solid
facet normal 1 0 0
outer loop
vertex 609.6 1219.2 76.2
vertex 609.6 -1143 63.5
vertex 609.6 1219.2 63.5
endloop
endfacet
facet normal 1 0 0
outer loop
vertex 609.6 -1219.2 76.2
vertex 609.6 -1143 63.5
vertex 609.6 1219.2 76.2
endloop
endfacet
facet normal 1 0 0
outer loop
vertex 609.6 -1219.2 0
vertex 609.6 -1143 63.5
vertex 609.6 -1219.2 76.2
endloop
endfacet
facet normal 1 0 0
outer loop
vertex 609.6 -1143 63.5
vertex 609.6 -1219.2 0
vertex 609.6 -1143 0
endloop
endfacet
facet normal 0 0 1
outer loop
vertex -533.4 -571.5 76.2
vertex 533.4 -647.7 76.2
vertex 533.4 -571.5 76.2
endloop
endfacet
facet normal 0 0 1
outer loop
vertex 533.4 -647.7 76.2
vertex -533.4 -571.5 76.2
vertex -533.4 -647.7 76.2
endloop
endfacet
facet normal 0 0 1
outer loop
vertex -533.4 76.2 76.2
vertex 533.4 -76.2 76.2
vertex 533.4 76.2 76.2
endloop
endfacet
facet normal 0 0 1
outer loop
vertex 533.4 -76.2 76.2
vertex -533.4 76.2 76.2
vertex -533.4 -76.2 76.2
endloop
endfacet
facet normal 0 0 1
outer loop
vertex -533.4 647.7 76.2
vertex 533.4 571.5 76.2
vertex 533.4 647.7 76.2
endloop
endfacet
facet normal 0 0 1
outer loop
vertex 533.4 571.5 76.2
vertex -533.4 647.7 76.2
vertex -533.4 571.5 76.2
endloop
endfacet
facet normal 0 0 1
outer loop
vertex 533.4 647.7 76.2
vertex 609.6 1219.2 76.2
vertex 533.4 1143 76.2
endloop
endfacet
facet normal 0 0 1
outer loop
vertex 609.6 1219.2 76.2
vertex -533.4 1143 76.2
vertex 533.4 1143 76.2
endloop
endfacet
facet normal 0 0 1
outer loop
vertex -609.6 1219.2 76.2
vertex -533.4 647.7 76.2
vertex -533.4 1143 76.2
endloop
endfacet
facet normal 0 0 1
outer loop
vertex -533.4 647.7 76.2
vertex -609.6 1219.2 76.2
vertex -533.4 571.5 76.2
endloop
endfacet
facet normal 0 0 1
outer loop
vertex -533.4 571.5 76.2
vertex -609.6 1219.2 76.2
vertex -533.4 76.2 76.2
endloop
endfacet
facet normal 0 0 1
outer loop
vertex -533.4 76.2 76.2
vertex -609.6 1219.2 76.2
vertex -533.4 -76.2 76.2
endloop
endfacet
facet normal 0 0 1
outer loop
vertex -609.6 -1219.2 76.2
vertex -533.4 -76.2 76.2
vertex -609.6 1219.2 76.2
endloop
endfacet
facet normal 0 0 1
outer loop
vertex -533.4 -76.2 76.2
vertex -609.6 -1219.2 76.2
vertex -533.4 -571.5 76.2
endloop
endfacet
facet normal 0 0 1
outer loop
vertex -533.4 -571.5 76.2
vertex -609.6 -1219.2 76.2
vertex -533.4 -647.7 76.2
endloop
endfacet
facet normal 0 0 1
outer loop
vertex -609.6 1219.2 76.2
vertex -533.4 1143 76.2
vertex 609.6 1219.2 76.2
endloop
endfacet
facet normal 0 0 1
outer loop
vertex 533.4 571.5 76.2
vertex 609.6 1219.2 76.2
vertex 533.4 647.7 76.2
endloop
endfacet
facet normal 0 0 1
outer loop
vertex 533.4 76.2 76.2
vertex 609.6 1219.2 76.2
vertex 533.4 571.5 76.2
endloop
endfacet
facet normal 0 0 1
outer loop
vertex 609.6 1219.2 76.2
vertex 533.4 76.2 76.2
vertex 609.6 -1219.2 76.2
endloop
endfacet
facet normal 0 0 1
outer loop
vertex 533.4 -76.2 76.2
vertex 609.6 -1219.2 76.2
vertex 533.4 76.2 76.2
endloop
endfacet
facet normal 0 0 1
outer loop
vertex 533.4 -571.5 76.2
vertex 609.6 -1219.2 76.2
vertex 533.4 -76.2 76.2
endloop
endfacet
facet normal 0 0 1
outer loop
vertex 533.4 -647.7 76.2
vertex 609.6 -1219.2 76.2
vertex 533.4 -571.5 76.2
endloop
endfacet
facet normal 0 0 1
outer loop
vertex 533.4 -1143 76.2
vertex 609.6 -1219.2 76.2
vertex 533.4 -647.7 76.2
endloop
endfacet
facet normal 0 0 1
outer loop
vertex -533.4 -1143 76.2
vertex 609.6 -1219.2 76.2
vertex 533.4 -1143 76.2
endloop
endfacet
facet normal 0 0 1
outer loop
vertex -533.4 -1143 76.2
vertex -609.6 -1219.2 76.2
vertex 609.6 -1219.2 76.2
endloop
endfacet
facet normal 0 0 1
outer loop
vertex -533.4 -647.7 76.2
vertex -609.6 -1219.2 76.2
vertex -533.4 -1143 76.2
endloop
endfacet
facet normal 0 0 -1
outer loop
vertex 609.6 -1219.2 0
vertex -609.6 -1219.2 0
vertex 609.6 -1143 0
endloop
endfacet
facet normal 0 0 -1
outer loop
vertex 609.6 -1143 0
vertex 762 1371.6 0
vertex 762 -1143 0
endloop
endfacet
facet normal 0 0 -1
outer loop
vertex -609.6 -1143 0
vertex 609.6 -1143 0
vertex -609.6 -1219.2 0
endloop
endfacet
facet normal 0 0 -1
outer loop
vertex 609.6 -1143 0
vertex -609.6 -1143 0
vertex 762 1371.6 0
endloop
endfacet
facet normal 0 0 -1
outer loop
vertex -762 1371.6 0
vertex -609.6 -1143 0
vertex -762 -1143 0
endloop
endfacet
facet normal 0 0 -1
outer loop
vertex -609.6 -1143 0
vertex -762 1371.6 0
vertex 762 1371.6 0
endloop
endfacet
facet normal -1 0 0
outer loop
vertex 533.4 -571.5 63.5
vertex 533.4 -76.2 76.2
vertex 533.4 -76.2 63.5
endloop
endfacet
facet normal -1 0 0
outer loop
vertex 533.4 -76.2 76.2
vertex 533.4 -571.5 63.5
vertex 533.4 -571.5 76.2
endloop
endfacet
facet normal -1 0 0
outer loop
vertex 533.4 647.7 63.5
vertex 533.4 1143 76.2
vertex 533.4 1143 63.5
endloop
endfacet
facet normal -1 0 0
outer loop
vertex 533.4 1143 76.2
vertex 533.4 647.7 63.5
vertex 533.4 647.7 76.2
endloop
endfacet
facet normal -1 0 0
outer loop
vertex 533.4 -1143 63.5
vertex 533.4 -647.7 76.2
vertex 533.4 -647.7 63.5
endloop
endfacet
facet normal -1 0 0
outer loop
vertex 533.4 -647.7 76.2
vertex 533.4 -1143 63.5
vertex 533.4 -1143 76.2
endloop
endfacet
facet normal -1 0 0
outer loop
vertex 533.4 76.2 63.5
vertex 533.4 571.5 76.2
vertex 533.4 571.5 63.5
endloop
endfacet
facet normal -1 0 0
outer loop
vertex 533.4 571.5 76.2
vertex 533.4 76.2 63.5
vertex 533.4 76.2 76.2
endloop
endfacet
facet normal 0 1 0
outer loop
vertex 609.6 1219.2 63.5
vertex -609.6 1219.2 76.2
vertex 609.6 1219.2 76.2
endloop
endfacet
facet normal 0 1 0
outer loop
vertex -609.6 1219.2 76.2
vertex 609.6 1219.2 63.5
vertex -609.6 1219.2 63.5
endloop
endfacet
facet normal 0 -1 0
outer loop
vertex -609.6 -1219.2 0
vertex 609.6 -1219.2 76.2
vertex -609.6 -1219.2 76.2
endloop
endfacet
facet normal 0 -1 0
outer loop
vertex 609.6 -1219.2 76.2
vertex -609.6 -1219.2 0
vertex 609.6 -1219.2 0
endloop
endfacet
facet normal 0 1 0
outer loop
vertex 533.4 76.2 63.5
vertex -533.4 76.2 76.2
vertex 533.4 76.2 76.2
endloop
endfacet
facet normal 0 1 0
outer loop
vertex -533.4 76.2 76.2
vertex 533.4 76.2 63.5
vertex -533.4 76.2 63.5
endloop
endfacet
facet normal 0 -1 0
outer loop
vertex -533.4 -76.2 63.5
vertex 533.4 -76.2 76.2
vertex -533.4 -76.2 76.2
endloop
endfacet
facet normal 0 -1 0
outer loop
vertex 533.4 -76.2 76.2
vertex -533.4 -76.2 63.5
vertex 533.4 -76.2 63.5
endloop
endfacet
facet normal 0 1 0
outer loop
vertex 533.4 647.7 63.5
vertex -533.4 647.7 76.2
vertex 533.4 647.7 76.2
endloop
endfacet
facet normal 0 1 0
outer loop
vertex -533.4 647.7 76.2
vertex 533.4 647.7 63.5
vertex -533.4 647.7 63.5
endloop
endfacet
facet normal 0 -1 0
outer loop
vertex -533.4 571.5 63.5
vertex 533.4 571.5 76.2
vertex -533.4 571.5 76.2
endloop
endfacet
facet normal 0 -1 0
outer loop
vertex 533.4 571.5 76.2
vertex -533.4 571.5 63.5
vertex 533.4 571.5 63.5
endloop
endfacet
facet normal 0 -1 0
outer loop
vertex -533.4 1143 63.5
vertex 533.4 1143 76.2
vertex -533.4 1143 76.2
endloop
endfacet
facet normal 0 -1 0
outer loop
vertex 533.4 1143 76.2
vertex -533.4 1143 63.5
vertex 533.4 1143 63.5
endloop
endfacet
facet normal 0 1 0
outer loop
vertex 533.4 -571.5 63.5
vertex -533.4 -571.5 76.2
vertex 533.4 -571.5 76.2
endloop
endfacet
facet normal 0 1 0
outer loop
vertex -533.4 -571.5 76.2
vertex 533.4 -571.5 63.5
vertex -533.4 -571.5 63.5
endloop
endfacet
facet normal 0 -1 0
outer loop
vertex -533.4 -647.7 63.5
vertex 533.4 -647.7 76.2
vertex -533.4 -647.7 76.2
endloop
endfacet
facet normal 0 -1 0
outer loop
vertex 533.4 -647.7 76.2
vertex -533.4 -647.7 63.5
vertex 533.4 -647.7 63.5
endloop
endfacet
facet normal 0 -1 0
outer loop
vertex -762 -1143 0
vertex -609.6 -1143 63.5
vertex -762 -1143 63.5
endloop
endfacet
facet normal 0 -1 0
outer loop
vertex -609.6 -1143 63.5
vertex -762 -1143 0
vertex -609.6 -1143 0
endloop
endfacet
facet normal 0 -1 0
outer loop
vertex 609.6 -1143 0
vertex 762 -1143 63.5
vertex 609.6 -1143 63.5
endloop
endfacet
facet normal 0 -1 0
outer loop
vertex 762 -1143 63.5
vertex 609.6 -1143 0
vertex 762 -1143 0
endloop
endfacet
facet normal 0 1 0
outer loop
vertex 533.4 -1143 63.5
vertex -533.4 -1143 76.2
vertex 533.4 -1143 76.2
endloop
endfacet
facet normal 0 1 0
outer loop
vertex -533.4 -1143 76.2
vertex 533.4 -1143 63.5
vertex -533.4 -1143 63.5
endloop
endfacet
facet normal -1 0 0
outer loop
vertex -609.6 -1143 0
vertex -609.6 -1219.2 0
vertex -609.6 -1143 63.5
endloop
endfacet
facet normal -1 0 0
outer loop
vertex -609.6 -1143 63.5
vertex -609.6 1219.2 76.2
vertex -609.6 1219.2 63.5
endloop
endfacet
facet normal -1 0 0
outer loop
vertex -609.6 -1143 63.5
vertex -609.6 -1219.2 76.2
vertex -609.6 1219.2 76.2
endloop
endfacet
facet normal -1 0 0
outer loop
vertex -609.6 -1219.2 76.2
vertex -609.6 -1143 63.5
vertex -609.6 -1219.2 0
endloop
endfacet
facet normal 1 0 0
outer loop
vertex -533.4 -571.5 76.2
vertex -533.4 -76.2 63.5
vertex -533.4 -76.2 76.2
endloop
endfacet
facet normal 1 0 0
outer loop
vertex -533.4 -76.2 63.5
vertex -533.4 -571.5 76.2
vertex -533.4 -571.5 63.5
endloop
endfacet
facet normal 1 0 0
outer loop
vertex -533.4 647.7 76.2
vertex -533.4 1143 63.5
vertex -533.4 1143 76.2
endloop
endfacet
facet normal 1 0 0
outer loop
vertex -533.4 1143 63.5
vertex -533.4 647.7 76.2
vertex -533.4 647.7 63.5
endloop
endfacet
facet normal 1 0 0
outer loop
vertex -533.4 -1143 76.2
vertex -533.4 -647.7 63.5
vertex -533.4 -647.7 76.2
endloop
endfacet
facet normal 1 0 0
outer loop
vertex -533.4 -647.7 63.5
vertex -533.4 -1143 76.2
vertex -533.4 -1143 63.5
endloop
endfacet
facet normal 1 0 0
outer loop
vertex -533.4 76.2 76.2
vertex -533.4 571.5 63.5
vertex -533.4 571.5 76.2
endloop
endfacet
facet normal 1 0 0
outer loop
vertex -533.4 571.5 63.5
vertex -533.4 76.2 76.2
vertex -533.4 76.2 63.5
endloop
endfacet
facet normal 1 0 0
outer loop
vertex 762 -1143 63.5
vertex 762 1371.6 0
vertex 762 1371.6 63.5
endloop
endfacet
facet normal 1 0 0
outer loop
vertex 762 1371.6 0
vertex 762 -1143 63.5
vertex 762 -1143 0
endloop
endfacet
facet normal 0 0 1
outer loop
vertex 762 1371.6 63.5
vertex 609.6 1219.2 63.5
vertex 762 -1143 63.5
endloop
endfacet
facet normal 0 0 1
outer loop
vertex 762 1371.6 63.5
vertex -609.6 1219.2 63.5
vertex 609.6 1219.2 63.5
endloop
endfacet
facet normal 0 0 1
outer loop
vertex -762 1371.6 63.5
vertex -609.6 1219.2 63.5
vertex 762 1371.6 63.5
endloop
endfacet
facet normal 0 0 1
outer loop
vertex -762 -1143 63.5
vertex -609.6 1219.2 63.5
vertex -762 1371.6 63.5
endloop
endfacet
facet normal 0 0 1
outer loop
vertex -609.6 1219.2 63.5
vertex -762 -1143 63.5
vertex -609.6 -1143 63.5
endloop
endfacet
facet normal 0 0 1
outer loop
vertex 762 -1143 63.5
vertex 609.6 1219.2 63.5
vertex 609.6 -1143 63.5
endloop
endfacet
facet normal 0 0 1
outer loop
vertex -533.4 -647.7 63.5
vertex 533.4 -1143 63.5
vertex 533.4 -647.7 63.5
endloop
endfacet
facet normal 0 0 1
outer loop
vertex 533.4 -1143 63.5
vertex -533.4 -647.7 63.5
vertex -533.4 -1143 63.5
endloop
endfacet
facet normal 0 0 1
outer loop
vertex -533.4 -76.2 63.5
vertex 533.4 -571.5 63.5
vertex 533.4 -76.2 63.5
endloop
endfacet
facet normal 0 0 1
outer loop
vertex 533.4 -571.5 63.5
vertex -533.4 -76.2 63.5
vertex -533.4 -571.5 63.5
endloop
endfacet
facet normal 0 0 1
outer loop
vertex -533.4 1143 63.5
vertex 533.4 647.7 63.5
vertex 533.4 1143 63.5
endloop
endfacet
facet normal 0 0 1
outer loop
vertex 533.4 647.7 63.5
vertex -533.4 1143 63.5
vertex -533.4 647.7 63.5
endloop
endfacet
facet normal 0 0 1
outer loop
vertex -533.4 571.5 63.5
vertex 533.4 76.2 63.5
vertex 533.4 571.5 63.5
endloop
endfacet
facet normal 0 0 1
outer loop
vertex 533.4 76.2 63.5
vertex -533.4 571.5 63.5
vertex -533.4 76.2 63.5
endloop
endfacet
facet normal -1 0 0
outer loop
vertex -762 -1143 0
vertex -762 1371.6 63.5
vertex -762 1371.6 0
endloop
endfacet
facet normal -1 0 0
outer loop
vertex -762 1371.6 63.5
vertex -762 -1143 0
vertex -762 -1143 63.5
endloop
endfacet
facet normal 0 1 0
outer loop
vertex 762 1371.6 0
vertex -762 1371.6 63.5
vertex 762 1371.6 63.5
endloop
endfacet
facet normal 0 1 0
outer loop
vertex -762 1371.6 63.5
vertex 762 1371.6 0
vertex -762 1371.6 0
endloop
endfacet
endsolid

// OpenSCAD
// file: ../components/wheel.scad
use <../lib/convert.scad>
use <../lib/colors.scad>

module wheel() {
  color_black()
  difference() {
      cylinder(h = inches(10), d = inches(31), center = true);
      cylinder(h = inches(13), d = inches(15), center = true);
  }
  color_steel()
    cylinder(h = inches(8), d = inches(15), center = true);
}

wheel();
// file: ../lib/colors.scad
module color_wood() {
  color("#F8D89D")
    children();
}

module color_hdpe() {
  color("#ccd")
    children();
}

module color_steel() {
  color("#888")
    children();
}

module color_white() {
  color("#fafafa")
    children();
}

module color_black() {
  color("#333")
    children();
}

module color_outside() {
  color("#90b0c4")
    children();
}
// file: ../components/trailer_side.scad
use <../lib/convert.scad>

side_thickness = inches(1.25);
bottom_offset = inches(16.71);
front_offset = inches(-51.85);

module trailer_side() {
  translate([front_offset, 0, bottom_offset])
  rotate([90, 0, 0])
    linear_extrude(height = side_thickness)
      import("../../drawings/sidewall.dxf");
}

trailer_side();
// file: ../components/trailer_floor.scad
use <../lib/convert.scad>

floor_thickness = inches(2.5);
floor_width = feet(5);
floor_length = feet(8) + inches(3);

module trailer_floor() {
  translate([0, 0, floor_thickness / 2])
    color("#f2ba52")
      cube([floor_width, floor_length, floor_thickness], center = true);
}

trailer_floor();
// file: ../components/trailer_frame.scad
use <../lib/convert.scad>
use <../lib/colors.scad>
use <../components/wheel.scad>

frame_width = feet(4);
frame_length = feet(8);
frame_thickness = inches(3);

module trailer_axel() {
  color_black()
  translate([0, inches(15), inches(-10)])
  rotate([0, 90, 0])
    cylinder(h = frame_width + inches(5), d = inches(3), center  = true);
}

module driver_wheel() {
  translate([feet(2.5), inches(15), inches(-10)])
  rotate([0, 90, 0])
    wheel();
}

module passenger_wheel() {
  mirror([1, 0, 0])
    driver_wheel();
}

module trailer_tongue() {
  union() {
    translate([inches(-1.5), 0, 0])
    rotate([0, 0, -60])
      cube([frame_width, frame_thickness, frame_thickness]);

    mirror([1, 0, 0])
    translate([inches(-1.5), 0, 0])
    rotate([0, 0, -60])
      cube([frame_width, frame_thickness, frame_thickness]);
  }
}

module trailer_frame_half() {
  union() {
    translate([(frame_width / 2) - frame_thickness, -frame_length / 2, 0])
      cube([frame_thickness, frame_length, frame_thickness]);

    translate([0, 0, 0])
      cube([frame_width / 2, frame_thickness, frame_thickness]);

    translate([0, -frame_thickness, 0])
      cube([frame_width / 2, frame_thickness, frame_thickness]);

    translate([0, (frame_length / 4) - (frame_thickness / 2), 0])
      cube([frame_width / 2, frame_thickness, frame_thickness]);

    translate([0, (frame_length / 2) - frame_thickness, 0])
      cube([frame_width / 2, frame_thickness, frame_thickness]);

    translate([0, -((frame_length / 4) + (frame_thickness / 2)), 0])
      cube([frame_width / 2, frame_thickness, frame_thickness]);

    translate([0, -(frame_length / 2), 0])
      cube([frame_width / 2, frame_thickness, frame_thickness]);
  }
}

module trailer_frame() {
  union() {
    trailer_frame_half();

    mirror([1, 0, 0])
      trailer_frame_half();
  }
}

module trailer() {
  translate([0, 0, -frame_thickness])
  color_black()
  rotate([0, 0, 180])
  union() {
    trailer_frame();

    translate([0, frame_length / 1.5, -frame_thickness])
    trailer_tongue();

    translate([0, frame_length / 4, -frame_thickness / 2])
      cube([frame_thickness, frame_length * 1.5, frame_thickness], center = true);
  }

  driver_wheel();
  passenger_wheel();
  trailer_axel();
}

trailer();
// file: ../lib/convert.scad
function inches(in) = in * 25.4;
function feet(ft) = inches(ft * 12);
// main file
use <../lib/convert.scad>

use <../components/trailer_frame.scad>
use <../components/trailer_floor.scad>
use <../components/trailer_side.scad>


module passenger_side() {
  translate([feet(-2.5), inches(-44), 0])
    rotate([0, 0, -90])
      trailer_side();
}

module driver_side() {
  mirror([1, 0, 0])
    passenger_side();
}

passenger_side();
driver_side();
trailer_frame();

translate([0, inches(4.5), 0])
  trailer_floor();
